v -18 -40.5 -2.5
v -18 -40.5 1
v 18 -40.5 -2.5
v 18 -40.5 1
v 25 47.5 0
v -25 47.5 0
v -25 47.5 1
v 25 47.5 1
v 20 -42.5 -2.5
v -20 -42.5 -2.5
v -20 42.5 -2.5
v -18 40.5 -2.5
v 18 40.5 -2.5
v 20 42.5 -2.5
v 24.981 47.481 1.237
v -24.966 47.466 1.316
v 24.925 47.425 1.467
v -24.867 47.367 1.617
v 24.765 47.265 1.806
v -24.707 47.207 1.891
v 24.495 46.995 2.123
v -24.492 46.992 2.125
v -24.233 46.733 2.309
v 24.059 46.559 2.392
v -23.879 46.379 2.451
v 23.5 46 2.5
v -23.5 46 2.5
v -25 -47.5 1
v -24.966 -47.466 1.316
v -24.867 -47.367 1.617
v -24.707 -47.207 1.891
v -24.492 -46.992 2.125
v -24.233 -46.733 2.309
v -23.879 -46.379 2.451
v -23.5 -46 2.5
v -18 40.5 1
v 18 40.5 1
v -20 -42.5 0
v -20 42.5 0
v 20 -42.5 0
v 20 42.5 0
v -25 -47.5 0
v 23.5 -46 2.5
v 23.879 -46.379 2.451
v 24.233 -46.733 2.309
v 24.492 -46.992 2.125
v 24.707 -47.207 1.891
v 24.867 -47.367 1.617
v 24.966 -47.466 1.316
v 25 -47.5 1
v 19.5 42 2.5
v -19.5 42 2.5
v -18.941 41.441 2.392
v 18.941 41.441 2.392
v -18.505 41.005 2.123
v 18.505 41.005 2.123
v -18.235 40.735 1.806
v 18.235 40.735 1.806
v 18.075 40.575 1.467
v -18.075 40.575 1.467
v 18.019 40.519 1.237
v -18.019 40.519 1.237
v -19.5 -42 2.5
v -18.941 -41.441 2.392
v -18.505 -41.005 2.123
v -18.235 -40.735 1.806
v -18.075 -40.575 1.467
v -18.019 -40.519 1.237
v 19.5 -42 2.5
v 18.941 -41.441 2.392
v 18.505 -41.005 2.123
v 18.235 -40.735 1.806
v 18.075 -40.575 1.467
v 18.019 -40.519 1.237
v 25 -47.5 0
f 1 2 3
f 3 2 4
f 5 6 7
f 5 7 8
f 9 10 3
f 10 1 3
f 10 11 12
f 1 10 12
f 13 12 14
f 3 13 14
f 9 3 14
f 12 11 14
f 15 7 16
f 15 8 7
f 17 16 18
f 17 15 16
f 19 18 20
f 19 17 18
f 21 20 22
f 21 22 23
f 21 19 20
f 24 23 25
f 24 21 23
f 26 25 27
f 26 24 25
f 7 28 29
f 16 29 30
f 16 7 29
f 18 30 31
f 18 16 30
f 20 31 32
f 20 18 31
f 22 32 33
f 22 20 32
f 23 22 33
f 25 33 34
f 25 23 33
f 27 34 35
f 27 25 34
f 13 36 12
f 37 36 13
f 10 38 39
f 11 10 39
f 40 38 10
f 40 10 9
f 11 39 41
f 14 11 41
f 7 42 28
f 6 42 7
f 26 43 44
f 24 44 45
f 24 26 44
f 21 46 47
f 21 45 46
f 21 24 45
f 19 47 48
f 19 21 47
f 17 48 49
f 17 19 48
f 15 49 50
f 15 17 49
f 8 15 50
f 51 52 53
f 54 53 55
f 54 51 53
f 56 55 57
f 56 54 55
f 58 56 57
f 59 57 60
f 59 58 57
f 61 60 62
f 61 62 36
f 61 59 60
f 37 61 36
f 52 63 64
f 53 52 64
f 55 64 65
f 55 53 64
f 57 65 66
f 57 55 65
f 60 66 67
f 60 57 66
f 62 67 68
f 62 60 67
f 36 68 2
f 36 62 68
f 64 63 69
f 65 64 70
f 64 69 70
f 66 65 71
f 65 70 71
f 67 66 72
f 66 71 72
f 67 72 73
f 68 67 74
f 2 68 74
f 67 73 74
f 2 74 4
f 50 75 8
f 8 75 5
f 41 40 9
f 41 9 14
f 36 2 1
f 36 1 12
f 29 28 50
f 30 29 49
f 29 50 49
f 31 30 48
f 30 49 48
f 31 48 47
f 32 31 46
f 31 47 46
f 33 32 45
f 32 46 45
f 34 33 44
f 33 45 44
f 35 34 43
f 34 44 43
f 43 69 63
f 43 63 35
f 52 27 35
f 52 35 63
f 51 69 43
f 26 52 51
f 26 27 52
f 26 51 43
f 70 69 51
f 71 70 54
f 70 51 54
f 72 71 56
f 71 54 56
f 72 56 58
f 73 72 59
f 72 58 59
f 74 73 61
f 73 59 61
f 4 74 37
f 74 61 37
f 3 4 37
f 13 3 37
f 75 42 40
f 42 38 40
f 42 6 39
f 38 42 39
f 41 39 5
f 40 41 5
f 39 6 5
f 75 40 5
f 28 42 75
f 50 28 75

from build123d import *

# Parameters (mm, degrees)
CROQUIS1_W              = 40
CROQUIS1_H              = 85
CROQUIS1_W_2            = 36
CROQUIS1_H_2            = 81
SALIENTE_EXTRUIR2_DEPTH = 2.5
CROQUIS2_W              = 50
CROQUIS2_H              = 95
CROQUIS2_W_2            = 40
CROQUIS2_H_2            = 85
SALIENTE_EXTRUIR3_DEPTH = 2.5
REDONDEO1_R             = 1.5


with BuildPart() as part:
    # Croquis1 → Saliente-Extruir2 (new, symmetric)
    with BuildSketch(Plane.XY):
        Rectangle(CROQUIS1_W, CROQUIS1_H)
        Rectangle(CROQUIS1_W_2, CROQUIS1_H_2, mode=Mode.SUBTRACT)
    extrude(amount=SALIENTE_EXTRUIR2_DEPTH, both=True)

    # Croquis2 → Saliente-Extruir3 (add)
    with BuildSketch(Plane.XY):
        Rectangle(CROQUIS2_W, CROQUIS2_H)
        Rectangle(CROQUIS2_W_2, CROQUIS2_H_2, mode=Mode.SUBTRACT)
    extrude(amount=SALIENTE_EXTRUIR3_DEPTH)

    # Redondeo1
    redondeo1_edges = [part.edges().sort_by_distance(p)[0] for p in [
        (-18, 0, 2.5),
        (0, -40.5, 2.5),
        (18, 0, 2.5),
        (0, 40.5, 2.5),
        (-25, 0, 2.5),
        (0, -47.5, 2.5),
        (25, 0, 2.5),
        (0, 47.5, 2.5),
    ]]
    fillet(redondeo1_edges, radius=REDONDEO1_R)


solid = part.part
